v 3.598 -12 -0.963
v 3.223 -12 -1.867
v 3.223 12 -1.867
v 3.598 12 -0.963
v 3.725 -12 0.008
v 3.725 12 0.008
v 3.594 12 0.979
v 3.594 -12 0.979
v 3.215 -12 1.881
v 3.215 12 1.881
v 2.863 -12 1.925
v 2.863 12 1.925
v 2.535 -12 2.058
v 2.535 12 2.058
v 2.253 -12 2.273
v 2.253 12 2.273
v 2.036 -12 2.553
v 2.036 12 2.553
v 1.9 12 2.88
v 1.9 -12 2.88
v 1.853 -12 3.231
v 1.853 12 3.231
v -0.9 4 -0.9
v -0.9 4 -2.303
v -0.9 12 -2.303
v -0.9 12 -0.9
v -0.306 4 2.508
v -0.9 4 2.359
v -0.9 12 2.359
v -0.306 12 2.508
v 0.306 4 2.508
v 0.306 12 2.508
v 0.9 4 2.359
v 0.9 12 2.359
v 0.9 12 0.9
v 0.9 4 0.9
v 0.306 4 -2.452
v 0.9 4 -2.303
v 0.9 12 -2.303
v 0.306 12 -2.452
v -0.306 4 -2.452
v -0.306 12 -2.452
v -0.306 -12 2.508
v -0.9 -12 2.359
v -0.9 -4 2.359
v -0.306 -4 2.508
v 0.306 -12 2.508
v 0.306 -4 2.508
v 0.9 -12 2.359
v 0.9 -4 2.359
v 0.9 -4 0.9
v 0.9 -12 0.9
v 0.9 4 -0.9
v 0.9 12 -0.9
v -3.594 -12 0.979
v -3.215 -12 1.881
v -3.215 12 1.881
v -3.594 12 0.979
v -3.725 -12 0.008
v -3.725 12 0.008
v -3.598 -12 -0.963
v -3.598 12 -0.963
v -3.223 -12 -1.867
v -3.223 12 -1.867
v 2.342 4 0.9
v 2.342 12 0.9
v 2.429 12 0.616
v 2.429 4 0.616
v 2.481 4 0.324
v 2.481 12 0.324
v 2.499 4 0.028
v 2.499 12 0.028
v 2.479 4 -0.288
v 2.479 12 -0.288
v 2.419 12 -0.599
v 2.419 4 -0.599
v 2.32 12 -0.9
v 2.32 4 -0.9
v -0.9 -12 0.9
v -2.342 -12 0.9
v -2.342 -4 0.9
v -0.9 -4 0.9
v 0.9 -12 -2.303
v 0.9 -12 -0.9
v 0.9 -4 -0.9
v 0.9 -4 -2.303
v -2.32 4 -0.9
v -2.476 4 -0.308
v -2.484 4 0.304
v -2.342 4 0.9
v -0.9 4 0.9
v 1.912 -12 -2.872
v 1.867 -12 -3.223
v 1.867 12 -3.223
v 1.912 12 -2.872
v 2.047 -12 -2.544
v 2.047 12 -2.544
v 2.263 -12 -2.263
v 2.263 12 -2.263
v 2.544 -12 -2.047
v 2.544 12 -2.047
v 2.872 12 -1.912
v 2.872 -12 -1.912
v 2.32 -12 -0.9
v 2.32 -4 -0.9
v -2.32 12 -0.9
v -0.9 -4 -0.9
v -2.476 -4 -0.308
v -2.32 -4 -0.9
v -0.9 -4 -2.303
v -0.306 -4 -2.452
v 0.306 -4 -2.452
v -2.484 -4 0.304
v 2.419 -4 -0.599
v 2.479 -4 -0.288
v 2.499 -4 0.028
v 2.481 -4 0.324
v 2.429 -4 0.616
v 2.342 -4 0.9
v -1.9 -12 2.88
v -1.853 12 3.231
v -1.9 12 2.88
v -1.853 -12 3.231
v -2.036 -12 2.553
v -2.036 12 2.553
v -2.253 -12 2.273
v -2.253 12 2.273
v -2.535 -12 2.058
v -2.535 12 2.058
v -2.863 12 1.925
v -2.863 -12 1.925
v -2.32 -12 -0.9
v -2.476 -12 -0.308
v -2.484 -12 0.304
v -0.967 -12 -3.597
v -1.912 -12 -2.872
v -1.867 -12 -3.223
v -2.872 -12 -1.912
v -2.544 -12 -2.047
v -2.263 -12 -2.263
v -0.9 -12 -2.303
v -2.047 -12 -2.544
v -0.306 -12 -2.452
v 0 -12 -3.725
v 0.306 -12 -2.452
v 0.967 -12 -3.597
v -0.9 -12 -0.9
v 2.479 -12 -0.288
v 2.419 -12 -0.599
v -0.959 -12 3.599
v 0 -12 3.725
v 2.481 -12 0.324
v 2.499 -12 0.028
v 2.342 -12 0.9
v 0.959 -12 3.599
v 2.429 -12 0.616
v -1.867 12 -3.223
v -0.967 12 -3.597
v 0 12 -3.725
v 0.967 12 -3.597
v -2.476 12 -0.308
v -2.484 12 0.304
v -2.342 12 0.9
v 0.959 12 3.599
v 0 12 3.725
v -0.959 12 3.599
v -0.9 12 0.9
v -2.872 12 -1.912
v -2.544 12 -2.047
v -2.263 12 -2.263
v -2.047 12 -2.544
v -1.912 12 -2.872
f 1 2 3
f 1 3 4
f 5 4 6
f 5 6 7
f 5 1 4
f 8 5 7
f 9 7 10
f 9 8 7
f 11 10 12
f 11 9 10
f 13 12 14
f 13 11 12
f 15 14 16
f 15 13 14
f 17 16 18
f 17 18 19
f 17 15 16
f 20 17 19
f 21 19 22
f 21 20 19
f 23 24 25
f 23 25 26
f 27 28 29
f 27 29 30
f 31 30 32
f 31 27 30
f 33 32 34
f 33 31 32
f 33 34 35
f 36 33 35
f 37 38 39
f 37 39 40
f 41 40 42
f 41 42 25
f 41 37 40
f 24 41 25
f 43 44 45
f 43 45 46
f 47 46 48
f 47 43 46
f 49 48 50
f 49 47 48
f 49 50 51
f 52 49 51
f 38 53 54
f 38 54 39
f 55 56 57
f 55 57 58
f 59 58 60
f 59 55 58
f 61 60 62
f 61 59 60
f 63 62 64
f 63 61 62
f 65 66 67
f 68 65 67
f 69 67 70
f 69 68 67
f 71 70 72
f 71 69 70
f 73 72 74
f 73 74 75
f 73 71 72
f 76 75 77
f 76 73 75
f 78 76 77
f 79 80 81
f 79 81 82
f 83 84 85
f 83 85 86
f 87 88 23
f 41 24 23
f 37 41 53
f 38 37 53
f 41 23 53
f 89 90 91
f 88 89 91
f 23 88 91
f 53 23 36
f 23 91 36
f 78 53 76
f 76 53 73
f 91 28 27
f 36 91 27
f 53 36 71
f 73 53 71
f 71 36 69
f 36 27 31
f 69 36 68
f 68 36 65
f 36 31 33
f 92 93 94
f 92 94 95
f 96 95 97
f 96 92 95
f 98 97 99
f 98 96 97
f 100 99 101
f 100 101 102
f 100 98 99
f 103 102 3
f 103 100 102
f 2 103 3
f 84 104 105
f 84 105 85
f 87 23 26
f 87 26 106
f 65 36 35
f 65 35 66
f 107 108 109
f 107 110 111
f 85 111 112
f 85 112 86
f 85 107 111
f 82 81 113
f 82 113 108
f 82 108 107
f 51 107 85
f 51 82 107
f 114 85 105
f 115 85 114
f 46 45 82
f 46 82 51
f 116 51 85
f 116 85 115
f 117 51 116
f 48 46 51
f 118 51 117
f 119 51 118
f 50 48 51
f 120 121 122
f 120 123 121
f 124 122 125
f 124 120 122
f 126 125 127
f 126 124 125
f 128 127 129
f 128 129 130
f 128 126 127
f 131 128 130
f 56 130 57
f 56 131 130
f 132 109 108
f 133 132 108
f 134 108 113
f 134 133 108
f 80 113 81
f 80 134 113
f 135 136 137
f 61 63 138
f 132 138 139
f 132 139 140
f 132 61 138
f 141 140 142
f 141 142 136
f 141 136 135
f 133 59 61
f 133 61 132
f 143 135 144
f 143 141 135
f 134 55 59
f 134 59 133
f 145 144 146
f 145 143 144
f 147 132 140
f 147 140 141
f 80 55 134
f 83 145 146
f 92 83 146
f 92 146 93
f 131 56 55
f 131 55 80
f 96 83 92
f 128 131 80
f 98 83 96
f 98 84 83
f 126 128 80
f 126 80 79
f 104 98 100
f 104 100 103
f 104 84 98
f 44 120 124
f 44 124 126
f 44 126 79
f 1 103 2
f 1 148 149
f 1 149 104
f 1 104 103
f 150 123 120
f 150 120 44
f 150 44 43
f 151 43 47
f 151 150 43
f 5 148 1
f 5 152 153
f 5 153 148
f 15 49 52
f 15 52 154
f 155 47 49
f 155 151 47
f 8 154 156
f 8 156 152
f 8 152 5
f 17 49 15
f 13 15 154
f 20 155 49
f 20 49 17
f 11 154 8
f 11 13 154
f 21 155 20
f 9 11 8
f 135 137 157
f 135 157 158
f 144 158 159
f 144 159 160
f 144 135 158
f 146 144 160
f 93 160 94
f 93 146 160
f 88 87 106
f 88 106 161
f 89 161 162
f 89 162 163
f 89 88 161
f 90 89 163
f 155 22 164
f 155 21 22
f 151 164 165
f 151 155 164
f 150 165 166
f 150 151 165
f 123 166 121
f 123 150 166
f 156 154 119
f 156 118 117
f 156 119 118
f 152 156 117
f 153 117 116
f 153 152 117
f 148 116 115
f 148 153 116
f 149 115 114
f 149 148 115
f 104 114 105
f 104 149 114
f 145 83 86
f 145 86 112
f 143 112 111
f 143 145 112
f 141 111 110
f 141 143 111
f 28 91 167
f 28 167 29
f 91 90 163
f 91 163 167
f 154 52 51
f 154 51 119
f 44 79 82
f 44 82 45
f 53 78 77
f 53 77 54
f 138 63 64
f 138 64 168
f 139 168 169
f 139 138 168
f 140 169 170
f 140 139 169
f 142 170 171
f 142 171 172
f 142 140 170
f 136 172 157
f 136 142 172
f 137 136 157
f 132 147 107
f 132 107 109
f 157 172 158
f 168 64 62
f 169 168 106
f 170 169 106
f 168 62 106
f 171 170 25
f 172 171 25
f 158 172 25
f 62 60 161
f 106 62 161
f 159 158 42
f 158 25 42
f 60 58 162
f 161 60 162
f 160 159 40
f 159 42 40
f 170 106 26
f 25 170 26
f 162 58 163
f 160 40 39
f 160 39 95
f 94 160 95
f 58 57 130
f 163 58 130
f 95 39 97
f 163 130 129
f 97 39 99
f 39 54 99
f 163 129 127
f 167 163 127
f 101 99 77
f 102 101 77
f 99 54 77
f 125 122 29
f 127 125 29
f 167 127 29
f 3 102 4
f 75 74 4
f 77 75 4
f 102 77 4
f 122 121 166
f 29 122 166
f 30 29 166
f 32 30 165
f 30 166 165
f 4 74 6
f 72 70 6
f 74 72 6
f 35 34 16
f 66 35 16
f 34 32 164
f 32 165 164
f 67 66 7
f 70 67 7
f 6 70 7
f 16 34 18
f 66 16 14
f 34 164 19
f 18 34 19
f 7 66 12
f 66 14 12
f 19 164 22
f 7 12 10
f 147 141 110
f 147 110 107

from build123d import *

# Parameters (mm, degrees)
F1_DEPTH = 12
F2_DEPTH = 4


with BuildPart() as f1:
    # F0 (on Front) → F1 (new body, symmetric)
    with BuildSketch(Plane.XZ):
        with BuildLine():
            ThreePointArc((-1.8533351034, 3.2312186547), (-2.2528950169, 2.2725457185), (-3.215001733, 1.8813263557))
            ThreePointArc((-3.215001733, 1.8813263557), (-3.7249912206, 0.0080874273), (-3.2231405801, -1.867348334))
            ThreePointArc((-3.2231405801, -1.867348334), (-2.2627416998, -2.2627416998), (-1.867348334, -3.2231405801))
            ThreePointArc((-1.867348334, -3.2231405801), (0, -3.725), (1.867348334, -3.2231405801))
            ThreePointArc((1.867348334, -3.2231405801), (2.2627416998, -2.2627416998), (3.2231405801, -1.867348334))
            ThreePointArc((3.2231405801, -1.867348334), (3.7249912206, 0.0080874273), (3.215001733, 1.8813263557))
            ThreePointArc((3.215001733, 1.8813263557), (2.2528950169, 2.2725457185), (1.8533351034, 3.2312186547))
            ThreePointArc((1.8533351034, 3.2312186547), (0, 3.725), (-1.8533351034, 3.2312186547))
        make_face()
        with BuildLine():
            ThreePointArc((-2.3419038887, 0.9), (-1.7775932123, 1.7844041548), (-0.9, 2.3592497012))
            ThreePointArc((-0.9, 2.3592497012), (0, 2.5269408414), (0.9, 2.3592497012))
            ThreePointArc((0.9, 2.3592497012), (1.7775932123, 1.7844041548), (2.3419038887, 0.9))
            ThreePointArc((2.3419038887, 0.9), (2.4594124113, 0.47098891), (2.499, 0.0279408414))
            ThreePointArc((2.499, 0.0279408414), (2.4539257567, -0.4445518891), (2.3203290273, -0.9))
            ThreePointArc((2.3203290273, -0.9), (1.75641402, -1.749701077), (0.9, -2.3033680185))
            ThreePointArc((0.9, -2.3033680185), (0, -2.4710591586), (-0.9, -2.3033680185))
            ThreePointArc((-0.9, -2.3033680185), (-1.75641402, -1.749701077), (-2.3203290273, -0.9))
            ThreePointArc((-2.3203290273, -0.9), (-2.4988205099, -0.0020101065), (-2.3419038887, 0.9))
        make_face(mode=Mode.SUBTRACT)
        with BuildLine():
            ThreePointArc((2.3419038887, 0.9), (1.7775932123, 1.7844041548), (0.9, 2.3592497012))
            Line((0.9, 2.3592497012), (0.9, 0.9))
            Line((0.9, 0.9), (2.3419038887, 0.9))
        make_face()
        with BuildLine():
            Line((-0.9, 0.9), (-0.9, 2.3592497012))
            ThreePointArc((-0.9, 2.3592497012), (-1.7775932123, 1.7844041548), (-2.3419038887, 0.9))
            Line((-2.3419038887, 0.9), (-0.9, 0.9))
        make_face()
        with BuildLine():
            ThreePointArc((0.9, -2.3033680185), (1.75641402, -1.749701077), (2.3203290273, -0.9))
            Line((2.3203290273, -0.9), (0.9, -0.9))
            Line((0.9, -0.9), (0.9, -2.3033680185))
        make_face()
        with BuildLine():
            Line((-0.9, -0.9), (-2.3203290273, -0.9))
            ThreePointArc((-2.3203290273, -0.9), (-1.75641402, -1.749701077), (-0.9, -2.3033680185))
            Line((-0.9, -2.3033680185), (-0.9, -0.9))
        make_face()
    extrude(amount=F1_DEPTH, both=True)

    # F0 (on Front) → F2 (join, symmetric)
    with BuildSketch(Plane.XZ):
        with BuildLine():
            ThreePointArc((0.9, 2.3592497012), (0, 2.5269408414), (-0.9, 2.3592497012))
            Line((-0.9, 2.3592497012), (-0.9, 0.9))
            Line((-0.9, 0.9), (-2.3419038887, 0.9))
            ThreePointArc((-2.3419038887, 0.9), (-2.4988205099, -0.0020101065), (-2.3203290273, -0.9))
            Line((-2.3203290273, -0.9), (-0.9, -0.9))
            Line((-0.9, -0.9), (-0.9, -2.3033680185))
            ThreePointArc((-0.9, -2.3033680185), (0, -2.4710591586), (0.9, -2.3033680185))
            Line((0.9, -2.3033680185), (0.9, -0.9))
            Line((0.9, -0.9), (2.3203290273, -0.9))
            ThreePointArc((2.3203290273, -0.9), (2.4539257567, -0.4445518891), (2.499, 0.0279408414))
            ThreePointArc((2.499, 0.0279408414), (2.4594124113, 0.47098891), (2.3419038887, 0.9))
            Line((2.3419038887, 0.9), (0.9, 0.9))
            Line((0.9, 0.9), (0.9, 2.3592497012))
        make_face()
    extrude(amount=F2_DEPTH, both=True)


solid = f1.part
